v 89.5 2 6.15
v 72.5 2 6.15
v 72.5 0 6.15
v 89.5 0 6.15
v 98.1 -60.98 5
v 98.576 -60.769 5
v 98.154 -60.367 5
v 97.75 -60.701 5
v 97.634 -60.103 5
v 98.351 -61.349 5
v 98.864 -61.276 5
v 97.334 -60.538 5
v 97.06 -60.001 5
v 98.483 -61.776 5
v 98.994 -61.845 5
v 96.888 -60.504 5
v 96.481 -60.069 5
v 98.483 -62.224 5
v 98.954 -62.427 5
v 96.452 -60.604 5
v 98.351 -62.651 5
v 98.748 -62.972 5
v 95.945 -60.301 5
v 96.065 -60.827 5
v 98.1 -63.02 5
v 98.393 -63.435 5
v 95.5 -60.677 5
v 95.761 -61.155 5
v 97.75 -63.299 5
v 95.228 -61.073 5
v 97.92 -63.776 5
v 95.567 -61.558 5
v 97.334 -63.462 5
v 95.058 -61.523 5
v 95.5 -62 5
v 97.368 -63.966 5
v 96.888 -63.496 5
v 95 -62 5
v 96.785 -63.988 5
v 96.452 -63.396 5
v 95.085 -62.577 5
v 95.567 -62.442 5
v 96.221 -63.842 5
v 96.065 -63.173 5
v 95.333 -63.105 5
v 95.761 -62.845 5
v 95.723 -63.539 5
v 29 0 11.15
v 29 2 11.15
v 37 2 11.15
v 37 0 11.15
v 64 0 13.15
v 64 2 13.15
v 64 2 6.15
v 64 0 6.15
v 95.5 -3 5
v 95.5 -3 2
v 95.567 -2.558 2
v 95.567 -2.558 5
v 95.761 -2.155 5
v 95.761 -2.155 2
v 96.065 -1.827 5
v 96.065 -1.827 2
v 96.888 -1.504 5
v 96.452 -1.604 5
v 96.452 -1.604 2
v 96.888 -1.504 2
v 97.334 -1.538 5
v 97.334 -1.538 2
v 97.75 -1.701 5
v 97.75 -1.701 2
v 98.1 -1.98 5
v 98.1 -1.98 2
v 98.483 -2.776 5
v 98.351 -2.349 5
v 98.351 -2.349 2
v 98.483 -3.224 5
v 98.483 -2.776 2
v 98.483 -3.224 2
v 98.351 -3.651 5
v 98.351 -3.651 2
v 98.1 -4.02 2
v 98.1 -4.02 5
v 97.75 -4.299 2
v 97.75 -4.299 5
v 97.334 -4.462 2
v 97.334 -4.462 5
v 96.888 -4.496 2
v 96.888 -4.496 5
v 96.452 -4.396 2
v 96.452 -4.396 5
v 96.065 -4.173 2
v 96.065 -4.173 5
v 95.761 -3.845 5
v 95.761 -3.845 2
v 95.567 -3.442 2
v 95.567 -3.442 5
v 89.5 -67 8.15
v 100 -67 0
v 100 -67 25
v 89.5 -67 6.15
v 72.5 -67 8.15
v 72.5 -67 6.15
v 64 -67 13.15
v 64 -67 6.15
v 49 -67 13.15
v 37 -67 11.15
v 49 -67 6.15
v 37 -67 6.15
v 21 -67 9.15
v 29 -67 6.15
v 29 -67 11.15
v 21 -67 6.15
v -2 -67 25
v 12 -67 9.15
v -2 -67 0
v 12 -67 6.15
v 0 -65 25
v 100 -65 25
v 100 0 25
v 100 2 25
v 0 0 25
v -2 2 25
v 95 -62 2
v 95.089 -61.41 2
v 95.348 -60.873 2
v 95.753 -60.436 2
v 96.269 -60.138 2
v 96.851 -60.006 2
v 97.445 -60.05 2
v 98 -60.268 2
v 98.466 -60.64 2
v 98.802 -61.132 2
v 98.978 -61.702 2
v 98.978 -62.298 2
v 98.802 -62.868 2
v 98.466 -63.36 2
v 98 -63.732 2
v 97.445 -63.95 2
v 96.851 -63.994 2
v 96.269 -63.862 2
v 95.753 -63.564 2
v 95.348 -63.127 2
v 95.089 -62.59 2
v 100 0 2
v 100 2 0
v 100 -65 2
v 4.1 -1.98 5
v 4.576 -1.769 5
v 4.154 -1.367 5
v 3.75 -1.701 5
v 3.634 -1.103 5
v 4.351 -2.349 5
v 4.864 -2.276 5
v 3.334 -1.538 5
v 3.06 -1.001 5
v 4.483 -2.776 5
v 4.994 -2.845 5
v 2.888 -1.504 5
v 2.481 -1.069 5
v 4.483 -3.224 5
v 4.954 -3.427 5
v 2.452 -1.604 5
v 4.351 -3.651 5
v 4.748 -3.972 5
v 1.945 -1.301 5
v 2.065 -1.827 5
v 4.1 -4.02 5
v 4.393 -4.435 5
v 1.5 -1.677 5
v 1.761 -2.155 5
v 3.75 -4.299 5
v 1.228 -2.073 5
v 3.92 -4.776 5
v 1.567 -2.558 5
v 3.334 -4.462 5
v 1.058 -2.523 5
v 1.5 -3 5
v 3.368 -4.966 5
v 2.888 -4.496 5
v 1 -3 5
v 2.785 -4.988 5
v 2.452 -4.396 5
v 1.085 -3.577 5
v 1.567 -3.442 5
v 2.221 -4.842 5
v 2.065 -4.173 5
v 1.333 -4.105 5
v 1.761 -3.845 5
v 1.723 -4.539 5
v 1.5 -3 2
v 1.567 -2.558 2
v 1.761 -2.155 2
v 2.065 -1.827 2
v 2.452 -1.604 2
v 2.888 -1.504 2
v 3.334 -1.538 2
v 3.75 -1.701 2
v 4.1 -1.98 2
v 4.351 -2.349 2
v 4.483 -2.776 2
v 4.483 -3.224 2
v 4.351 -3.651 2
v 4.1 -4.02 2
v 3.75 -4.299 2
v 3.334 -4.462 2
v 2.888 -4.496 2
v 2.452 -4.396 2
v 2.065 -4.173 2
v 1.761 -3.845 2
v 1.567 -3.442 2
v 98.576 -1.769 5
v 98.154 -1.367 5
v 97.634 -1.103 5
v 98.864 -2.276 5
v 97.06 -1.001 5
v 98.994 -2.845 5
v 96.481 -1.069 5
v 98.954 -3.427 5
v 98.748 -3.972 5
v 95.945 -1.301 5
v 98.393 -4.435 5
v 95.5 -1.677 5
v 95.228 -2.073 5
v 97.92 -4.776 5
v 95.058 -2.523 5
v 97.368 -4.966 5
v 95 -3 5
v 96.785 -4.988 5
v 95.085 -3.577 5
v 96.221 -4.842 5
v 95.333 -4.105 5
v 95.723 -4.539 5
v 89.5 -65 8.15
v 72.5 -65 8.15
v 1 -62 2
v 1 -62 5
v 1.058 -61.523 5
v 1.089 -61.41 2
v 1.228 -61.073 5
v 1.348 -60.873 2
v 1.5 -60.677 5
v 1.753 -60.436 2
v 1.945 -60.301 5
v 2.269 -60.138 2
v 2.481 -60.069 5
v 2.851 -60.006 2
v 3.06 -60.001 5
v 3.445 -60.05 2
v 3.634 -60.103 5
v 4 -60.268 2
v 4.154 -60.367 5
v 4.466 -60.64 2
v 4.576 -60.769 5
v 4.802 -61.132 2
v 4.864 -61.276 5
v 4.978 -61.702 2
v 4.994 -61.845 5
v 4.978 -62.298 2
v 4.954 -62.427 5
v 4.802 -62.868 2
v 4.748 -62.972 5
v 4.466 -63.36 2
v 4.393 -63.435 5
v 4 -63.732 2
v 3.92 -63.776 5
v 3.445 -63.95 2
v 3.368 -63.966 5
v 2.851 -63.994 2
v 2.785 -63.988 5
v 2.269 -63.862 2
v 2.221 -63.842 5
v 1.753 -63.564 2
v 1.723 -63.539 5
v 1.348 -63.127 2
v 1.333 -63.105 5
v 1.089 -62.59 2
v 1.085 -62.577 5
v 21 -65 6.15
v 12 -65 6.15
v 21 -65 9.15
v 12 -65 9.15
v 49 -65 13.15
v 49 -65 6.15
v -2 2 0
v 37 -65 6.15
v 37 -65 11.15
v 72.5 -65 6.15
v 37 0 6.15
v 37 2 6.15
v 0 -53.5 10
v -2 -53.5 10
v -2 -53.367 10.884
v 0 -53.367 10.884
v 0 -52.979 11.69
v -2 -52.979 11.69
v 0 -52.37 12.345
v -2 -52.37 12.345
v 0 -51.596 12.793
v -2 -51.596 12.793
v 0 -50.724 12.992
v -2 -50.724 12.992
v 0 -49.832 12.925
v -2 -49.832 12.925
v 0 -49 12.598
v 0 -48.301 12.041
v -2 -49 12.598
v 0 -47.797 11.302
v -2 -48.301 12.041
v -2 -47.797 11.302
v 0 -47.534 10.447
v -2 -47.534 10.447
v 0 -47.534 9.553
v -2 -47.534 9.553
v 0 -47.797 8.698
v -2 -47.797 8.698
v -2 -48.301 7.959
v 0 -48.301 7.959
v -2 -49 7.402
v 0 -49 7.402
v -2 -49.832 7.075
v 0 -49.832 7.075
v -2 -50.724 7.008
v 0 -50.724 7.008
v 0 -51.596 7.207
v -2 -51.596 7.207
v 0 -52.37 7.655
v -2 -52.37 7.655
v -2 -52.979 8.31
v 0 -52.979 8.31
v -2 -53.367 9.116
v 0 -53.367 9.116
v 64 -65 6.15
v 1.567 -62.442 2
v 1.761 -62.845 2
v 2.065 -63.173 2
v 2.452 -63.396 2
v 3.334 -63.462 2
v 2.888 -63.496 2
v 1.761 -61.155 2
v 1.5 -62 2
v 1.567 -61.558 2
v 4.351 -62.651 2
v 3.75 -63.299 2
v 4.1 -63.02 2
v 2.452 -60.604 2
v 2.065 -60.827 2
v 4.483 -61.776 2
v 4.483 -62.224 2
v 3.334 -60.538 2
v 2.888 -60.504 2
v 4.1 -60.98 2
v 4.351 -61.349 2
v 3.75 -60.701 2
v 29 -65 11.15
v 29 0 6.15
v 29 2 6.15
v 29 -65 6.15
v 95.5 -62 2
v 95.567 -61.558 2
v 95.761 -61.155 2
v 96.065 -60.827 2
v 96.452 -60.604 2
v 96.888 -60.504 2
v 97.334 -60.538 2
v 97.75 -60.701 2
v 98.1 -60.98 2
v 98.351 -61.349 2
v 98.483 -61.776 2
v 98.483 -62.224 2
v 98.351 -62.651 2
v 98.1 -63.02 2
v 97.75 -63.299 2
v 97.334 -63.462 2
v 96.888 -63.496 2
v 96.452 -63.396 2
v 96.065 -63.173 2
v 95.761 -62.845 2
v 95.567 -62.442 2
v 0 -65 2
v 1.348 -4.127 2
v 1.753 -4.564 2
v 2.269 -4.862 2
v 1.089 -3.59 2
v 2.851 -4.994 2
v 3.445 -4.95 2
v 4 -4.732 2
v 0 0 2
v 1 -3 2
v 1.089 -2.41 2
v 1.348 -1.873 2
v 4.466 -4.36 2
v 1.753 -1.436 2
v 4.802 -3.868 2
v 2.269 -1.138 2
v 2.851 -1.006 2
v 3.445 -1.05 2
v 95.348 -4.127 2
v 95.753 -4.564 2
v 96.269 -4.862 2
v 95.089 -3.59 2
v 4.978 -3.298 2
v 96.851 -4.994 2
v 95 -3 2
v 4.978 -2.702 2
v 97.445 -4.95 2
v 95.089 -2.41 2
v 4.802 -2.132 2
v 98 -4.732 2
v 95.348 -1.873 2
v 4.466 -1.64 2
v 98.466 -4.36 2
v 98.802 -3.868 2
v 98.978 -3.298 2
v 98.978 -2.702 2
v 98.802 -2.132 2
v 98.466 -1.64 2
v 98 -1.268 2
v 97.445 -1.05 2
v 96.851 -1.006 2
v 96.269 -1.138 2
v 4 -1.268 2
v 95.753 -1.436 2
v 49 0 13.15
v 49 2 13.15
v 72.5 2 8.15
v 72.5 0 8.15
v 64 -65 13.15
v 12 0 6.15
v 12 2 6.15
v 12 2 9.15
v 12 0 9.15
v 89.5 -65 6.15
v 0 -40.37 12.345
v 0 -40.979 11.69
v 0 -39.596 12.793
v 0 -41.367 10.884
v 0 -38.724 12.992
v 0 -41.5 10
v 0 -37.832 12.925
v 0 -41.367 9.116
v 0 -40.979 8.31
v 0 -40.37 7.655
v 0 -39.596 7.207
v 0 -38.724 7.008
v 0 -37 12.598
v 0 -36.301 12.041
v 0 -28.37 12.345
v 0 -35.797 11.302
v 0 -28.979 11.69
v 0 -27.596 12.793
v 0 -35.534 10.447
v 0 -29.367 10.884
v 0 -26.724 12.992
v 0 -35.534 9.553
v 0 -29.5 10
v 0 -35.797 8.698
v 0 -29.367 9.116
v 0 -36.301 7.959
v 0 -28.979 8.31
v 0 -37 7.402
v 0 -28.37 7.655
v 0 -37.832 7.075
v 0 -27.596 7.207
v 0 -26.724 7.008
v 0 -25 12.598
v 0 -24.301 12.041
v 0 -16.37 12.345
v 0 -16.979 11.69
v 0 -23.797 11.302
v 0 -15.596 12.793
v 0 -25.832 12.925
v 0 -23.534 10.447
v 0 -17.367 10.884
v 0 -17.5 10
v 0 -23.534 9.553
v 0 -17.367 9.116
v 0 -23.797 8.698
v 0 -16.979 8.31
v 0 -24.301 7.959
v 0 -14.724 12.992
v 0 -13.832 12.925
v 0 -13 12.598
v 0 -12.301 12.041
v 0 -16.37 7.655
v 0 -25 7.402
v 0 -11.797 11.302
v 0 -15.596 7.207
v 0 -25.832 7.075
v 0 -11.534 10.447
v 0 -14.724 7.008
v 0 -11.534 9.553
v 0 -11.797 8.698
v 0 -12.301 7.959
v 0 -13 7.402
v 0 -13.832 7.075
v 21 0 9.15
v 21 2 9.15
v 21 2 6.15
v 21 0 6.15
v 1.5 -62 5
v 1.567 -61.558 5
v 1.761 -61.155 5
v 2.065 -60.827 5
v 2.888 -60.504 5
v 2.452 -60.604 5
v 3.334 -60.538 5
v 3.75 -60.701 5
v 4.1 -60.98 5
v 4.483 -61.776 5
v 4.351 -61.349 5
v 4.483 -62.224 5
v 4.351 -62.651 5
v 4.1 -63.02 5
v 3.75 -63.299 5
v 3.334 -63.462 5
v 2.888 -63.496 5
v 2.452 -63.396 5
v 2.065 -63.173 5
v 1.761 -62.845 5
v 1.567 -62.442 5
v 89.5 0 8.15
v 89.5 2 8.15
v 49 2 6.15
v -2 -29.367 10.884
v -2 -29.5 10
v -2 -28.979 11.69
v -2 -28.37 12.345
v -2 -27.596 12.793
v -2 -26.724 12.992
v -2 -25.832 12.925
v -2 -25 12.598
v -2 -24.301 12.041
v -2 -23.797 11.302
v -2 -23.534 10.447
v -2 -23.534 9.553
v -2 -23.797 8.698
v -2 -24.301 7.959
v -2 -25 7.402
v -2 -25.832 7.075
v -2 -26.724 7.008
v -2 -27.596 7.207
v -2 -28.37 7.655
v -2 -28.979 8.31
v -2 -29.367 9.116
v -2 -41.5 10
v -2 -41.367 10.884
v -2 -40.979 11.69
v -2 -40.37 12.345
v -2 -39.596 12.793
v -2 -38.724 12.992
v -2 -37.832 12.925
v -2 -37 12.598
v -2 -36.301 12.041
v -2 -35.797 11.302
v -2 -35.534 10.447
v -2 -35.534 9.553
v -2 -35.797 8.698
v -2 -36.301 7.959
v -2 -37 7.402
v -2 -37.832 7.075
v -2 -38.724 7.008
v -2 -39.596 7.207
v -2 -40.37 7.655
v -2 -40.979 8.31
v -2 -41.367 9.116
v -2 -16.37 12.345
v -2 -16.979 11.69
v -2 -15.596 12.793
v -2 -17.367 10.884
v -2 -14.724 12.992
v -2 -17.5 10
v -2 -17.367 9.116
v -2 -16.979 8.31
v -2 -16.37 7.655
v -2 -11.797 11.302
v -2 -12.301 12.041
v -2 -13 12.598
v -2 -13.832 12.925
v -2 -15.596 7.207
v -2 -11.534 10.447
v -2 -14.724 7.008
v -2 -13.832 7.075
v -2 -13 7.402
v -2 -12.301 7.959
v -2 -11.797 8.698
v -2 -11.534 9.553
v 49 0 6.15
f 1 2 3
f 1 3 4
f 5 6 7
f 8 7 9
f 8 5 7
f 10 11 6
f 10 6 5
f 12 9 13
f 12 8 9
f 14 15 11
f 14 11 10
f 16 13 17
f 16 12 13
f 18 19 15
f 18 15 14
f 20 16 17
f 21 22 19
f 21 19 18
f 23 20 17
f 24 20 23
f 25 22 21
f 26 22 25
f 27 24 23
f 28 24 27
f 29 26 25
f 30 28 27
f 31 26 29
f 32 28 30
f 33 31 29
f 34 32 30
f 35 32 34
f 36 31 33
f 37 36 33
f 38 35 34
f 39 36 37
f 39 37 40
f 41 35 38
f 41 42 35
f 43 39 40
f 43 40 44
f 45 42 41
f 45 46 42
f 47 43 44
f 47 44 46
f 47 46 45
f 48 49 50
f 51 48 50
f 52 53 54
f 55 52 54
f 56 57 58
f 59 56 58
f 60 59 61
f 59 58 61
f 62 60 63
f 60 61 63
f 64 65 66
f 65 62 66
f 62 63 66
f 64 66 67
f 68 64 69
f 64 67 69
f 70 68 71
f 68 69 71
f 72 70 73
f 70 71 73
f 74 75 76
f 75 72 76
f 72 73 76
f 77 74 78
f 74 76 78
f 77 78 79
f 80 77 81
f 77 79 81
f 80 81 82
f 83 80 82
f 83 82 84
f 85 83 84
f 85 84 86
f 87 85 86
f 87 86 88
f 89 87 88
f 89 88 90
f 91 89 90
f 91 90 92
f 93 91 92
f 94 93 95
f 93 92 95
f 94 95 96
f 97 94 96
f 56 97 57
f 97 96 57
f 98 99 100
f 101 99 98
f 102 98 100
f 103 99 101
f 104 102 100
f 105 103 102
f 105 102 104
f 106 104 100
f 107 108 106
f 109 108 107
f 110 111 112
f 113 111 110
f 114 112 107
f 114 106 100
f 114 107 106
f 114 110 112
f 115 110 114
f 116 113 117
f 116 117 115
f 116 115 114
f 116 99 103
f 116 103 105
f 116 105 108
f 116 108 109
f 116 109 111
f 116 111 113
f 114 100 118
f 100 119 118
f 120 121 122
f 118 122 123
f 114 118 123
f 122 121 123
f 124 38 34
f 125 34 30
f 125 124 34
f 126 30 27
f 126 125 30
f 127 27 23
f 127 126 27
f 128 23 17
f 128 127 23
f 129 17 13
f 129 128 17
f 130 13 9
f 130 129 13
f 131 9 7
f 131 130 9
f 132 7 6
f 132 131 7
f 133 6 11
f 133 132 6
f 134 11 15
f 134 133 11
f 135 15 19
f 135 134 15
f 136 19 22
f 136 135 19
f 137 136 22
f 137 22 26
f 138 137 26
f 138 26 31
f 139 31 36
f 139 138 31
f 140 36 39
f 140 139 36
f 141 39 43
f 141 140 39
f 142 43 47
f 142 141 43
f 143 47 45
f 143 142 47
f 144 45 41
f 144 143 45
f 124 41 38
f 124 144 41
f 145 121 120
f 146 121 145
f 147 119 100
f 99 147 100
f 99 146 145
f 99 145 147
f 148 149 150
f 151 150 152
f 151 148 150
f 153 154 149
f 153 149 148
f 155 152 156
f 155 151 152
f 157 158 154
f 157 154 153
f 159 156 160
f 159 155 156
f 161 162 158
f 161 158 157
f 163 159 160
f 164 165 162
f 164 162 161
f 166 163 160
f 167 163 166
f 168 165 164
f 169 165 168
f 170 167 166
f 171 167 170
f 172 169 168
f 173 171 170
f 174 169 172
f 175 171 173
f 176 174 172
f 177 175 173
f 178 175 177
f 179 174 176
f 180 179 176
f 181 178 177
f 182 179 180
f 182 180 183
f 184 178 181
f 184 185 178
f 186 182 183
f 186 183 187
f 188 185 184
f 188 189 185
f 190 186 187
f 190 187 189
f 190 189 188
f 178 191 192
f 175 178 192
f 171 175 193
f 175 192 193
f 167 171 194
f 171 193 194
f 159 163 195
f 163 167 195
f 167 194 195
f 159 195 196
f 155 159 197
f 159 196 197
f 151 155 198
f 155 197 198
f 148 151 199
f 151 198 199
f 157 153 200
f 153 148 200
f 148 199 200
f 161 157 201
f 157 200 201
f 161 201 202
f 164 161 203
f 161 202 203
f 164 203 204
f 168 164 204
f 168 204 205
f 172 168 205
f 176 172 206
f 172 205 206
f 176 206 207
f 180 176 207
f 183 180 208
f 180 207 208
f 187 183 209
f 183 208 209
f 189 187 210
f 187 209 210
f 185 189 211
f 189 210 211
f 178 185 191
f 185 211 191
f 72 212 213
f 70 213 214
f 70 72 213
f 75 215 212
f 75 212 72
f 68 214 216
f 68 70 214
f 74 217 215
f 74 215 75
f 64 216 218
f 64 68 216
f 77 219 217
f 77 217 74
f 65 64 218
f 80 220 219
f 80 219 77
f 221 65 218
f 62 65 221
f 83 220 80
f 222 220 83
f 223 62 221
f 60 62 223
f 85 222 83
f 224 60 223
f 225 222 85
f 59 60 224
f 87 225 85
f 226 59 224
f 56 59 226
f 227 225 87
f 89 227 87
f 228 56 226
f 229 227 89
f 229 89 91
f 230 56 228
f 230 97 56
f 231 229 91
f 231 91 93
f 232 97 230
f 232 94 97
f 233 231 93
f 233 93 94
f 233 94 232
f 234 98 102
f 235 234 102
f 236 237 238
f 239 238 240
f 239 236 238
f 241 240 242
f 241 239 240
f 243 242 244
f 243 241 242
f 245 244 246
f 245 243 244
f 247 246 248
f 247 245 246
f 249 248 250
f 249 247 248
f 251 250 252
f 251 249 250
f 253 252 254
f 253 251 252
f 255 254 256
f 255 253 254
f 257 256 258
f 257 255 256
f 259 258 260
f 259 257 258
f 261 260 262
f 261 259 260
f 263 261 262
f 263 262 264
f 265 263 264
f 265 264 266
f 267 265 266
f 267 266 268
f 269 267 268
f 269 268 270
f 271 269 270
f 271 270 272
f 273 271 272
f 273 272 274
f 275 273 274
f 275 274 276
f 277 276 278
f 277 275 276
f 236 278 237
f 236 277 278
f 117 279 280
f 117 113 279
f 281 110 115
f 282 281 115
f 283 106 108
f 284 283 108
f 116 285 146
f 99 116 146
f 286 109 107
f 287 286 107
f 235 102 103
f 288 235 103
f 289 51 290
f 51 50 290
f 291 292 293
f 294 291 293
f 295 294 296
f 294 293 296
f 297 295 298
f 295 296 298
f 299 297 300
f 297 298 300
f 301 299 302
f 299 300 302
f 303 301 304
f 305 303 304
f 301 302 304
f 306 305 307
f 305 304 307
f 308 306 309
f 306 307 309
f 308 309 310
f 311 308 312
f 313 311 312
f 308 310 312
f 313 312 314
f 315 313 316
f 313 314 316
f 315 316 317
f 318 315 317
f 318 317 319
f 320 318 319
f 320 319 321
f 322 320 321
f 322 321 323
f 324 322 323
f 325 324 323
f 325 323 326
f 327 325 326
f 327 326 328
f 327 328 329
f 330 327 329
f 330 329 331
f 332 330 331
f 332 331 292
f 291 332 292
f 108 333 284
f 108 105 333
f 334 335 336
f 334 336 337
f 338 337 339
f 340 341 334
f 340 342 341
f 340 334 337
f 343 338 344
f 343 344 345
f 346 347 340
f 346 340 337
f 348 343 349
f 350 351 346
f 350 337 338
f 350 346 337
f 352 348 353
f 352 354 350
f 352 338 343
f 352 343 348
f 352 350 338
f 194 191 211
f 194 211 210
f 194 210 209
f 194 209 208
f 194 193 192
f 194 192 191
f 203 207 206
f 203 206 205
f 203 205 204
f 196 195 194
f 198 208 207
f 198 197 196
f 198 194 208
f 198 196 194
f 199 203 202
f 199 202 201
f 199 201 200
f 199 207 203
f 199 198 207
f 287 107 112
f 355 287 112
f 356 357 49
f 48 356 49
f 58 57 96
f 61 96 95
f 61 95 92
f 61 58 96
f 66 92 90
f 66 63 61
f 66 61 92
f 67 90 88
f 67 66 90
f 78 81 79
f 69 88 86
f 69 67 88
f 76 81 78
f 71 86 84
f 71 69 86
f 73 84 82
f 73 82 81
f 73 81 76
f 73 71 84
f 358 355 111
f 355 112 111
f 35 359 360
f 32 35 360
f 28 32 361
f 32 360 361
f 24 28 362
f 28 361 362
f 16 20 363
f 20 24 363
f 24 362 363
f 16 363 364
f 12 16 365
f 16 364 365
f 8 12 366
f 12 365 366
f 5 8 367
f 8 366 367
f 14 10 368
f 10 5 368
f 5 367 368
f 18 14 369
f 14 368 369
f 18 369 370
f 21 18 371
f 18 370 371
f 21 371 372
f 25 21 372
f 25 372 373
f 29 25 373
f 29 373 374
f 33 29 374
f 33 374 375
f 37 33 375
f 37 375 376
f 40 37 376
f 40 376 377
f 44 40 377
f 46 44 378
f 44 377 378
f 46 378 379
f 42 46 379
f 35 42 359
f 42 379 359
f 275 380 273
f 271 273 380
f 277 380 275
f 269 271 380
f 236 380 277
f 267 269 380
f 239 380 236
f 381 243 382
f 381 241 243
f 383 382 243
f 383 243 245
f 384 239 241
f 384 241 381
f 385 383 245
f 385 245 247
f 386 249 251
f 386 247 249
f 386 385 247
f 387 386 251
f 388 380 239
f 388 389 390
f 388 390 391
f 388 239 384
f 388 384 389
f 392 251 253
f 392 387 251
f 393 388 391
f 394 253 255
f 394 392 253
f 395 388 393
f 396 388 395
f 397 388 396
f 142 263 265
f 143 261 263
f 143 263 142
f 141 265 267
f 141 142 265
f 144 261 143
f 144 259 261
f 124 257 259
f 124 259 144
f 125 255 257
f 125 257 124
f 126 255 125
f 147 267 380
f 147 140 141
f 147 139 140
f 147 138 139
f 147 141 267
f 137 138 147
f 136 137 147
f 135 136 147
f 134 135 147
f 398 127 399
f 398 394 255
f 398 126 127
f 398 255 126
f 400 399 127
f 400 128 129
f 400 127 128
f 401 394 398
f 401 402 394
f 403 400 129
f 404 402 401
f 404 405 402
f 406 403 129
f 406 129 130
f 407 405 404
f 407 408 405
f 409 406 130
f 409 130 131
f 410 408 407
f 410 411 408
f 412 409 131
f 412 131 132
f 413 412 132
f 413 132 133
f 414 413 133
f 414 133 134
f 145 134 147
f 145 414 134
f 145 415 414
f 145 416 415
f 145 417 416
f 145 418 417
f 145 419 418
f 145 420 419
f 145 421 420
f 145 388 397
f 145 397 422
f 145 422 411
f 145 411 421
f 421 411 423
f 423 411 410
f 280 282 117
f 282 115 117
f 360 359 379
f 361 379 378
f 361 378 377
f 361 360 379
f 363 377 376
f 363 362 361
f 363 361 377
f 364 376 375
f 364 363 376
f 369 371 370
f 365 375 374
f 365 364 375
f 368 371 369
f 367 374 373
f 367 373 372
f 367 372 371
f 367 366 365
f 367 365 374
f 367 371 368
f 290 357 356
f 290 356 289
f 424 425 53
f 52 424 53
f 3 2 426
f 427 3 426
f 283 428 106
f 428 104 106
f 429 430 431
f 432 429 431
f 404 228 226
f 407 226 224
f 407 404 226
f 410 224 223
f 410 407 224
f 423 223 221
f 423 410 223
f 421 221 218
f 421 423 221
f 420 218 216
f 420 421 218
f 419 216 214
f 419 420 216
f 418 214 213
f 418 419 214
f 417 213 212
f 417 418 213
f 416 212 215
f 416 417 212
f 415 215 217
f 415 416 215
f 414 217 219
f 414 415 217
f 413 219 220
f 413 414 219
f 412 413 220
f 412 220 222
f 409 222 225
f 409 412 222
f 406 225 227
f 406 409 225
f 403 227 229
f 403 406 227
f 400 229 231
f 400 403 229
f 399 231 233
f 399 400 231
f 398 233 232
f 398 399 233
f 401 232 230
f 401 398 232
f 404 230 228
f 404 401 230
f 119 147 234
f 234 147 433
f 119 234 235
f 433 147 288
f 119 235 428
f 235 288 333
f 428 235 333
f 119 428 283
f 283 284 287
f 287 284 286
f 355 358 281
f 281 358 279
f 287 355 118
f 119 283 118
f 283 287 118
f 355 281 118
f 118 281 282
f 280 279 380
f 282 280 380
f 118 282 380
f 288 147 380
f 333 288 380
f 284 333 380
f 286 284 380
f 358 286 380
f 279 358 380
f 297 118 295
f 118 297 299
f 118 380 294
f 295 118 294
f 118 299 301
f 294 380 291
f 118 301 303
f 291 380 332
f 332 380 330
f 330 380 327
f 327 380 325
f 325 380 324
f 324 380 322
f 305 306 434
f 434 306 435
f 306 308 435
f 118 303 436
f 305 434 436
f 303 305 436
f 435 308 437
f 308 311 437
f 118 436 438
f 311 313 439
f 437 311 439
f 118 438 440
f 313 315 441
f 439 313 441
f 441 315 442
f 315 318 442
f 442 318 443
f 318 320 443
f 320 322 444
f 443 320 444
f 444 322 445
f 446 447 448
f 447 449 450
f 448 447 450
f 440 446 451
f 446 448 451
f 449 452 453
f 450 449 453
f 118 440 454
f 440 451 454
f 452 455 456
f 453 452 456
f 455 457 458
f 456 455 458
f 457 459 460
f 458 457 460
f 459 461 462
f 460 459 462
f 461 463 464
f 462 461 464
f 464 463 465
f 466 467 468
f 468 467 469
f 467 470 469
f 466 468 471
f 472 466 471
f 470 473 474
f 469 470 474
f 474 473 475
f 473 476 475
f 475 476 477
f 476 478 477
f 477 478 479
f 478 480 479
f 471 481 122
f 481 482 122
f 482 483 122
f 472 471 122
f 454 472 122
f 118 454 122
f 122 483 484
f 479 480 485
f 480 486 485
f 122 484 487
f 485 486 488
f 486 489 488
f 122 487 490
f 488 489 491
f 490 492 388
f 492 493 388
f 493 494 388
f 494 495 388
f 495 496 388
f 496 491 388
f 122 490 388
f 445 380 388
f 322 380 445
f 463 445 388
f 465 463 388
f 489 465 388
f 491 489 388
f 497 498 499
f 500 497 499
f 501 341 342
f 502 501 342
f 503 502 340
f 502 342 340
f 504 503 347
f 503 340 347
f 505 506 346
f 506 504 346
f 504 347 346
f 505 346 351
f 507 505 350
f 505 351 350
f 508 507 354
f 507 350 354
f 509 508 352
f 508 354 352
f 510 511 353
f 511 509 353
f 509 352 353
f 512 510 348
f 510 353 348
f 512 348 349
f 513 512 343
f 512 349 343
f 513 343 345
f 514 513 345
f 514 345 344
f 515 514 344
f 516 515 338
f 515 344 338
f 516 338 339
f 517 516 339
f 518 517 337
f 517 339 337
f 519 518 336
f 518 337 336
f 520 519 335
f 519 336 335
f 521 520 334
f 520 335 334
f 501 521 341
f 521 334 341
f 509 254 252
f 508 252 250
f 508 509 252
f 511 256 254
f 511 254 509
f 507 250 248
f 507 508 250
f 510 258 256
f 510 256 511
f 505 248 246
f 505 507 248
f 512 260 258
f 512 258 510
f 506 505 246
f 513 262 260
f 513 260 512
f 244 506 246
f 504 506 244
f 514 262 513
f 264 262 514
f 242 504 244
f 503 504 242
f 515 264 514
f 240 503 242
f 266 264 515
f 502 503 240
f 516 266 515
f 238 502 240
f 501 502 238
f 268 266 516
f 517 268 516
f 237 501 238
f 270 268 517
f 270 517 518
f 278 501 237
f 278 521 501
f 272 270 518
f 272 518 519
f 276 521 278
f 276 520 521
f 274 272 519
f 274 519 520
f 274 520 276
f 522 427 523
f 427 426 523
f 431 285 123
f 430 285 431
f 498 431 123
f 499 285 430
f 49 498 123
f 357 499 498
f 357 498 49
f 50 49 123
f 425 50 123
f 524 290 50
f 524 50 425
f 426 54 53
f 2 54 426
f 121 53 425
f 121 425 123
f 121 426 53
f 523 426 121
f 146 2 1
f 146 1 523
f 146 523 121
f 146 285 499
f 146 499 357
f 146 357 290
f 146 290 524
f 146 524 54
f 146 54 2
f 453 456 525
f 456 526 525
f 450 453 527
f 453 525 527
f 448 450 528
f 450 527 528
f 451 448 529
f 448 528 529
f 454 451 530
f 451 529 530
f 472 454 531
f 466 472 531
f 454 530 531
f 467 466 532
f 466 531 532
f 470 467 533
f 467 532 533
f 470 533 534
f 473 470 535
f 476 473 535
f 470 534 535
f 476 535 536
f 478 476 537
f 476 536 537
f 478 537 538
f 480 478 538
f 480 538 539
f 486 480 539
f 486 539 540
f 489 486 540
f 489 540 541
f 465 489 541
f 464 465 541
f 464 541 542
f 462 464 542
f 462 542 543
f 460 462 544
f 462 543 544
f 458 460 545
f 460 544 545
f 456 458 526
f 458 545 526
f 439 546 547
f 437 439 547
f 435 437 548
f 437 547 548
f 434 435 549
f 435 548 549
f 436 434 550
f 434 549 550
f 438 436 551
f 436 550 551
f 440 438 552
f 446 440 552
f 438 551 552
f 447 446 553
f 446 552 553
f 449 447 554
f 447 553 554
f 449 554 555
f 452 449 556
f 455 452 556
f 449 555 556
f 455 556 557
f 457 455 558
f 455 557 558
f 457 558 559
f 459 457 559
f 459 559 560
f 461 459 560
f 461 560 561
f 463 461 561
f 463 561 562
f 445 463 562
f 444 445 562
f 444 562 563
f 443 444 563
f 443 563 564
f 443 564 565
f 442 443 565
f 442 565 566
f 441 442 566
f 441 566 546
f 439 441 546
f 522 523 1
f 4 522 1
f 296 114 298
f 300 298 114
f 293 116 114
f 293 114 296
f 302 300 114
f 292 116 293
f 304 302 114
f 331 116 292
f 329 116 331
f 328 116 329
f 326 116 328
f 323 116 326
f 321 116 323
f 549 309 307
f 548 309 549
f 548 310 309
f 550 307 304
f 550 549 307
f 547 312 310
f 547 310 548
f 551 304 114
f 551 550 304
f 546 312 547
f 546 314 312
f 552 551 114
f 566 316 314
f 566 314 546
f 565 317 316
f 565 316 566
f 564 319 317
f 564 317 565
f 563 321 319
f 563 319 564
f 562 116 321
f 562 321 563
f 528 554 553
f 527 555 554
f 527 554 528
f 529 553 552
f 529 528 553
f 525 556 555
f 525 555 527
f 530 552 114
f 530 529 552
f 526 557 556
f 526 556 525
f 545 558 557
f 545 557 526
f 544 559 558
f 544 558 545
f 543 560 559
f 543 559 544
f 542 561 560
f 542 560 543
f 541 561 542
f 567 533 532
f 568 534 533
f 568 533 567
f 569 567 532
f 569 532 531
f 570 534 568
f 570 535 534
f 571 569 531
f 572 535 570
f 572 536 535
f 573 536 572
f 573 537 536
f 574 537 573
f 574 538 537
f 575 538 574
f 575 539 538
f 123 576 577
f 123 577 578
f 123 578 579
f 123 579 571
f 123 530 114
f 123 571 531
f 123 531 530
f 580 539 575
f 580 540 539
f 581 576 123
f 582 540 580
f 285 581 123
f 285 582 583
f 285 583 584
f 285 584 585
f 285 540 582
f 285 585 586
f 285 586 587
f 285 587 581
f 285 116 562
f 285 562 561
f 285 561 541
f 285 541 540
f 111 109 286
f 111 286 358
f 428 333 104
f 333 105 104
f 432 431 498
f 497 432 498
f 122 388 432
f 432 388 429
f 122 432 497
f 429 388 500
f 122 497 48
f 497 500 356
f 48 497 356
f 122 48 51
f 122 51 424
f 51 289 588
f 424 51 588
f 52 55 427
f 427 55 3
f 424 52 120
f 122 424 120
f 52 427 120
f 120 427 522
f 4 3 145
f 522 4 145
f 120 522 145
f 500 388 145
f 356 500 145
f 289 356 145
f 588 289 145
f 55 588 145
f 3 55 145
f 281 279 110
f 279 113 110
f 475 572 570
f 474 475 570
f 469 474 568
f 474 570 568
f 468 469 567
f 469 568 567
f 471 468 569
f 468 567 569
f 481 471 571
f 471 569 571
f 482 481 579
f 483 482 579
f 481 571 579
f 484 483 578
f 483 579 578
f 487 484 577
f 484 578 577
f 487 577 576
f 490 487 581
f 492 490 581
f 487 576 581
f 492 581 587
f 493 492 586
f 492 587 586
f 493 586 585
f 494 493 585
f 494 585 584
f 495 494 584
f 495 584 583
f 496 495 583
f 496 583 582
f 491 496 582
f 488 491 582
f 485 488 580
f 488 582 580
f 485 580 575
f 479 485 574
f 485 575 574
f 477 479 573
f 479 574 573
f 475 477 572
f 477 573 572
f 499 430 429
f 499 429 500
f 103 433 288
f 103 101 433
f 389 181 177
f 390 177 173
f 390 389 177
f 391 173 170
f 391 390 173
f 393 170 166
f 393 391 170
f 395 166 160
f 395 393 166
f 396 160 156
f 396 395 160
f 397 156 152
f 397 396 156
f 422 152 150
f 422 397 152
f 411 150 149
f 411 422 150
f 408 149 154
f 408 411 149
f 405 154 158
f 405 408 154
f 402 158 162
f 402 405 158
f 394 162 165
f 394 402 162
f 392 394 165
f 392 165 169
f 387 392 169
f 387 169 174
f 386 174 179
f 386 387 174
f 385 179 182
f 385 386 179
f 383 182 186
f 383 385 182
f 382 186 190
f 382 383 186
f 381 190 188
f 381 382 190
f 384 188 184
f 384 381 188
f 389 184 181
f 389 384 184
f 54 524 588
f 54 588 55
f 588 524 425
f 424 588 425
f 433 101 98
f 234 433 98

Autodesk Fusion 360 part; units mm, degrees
sketch "Sketch1" plane through (0, 0, 0) normal (0, 0, 1) x (1, 0, 0)
  line L0 (0, 0) -> (100, 0)
  line L1 (100, 0) -> (100, -65)
  line L2 (100, -65) -> (0, -65)
  line L3 (0, -65) -> (0, 0)
  dimension "d1" = 100
  dimension "d2" = 65
extrude "Extrude1" add sketch "Sketch1" along normal blind 2
sketch "Sketch2" plane through (0, 0, 2) normal (0, 0, 1) x (-1, 0, 0)
  line L0 (0, 65) -> (-100, 65)
  line L1 (-100, 65) -> (-100, 0)
  line L2 (-100, 0) -> (0, 0)
  line L3 (0, 0) -> (0, 65)
  line L4 (0, 65) -> (-120, 65)
  line L5 (-120, 65) -> (-210, 65)
  line L6 (-210, 65) -> (-290, 65)
  line L7 (-290, 65) -> (-370, 65)
  line L8 (-370, 65) -> (-490, 65)
  line L9 (-490, 65) -> (-640, 65)
  line L10 (-640, 65) -> (-725, 65)
  line L11 (-725, 65) -> (-895, 65)
  line L12 (-895, 65) -> (-1000, 65)
  line L13 (0, 0) -> (-1.5, 0)
  line L14 (-1.5, 0) -> (-1.5, 1.5)
  line L15 (-1.5, 1.5) -> (-1.5, 3)
  line L16 (-1.5, 3) -> (-3, 3)
  circle A0 centre (-3, 3) radius 1.5
  circle A1 centre (-3, 3) radius 2
  dimension "d5" = 120
  dimension "d6" = 90
  dimension "d7" = 80
  dimension "d8" = 80
  dimension "d9" = 120
  dimension "d10" = 150
  dimension "d11" = 85
  dimension "d12" = 170
  dimension "d13" = 105
  dimension "d14" = 1.5
  dimension "d15" = 1.5
  dimension "d16" = 1.5
  dimension "d17" = 1.5
  dimension "d18" = 3
extrude "Extrude2" add sketch "Sketch2" along normal blind 3 contours A1
pattern_linear "R-Pattern2" count 2 spacing 94 along (1, 0, 0) count 2 spacing 59 along (0, -1, 0) of "Extrude2"
sketch "Sketch4" plane through (0, 0, 0) normal (0, 0, -1) x (1, 0, 0)
  line L0 (100, 65) -> (0, 65)
  line L1 (0, 65) -> (0, 0)
  line L2 (0, 0) -> (100, 0)
  line L3 (100, 0) -> (100, 65)
  line L4 (0, 0) -> (-2, 0)
  line L5 (-2, 0) -> (-2, 65)
  line L6 (-2, 65) -> (0, 65)
  line L7 (0, 65) -> (0, 0)
  line L8 (-2, 65) -> (100, 65)
  line L9 (100, 65) -> (100, 67)
  line L10 (100, 67) -> (-2, 67)
  line L11 (-2, 67) -> (-2, 65)
  dimension "d37" = 2
  dimension "d38" = 2
extrude "Extrude6" add sketch "Sketch4" against normal blind 25 contours L0 L6 L8 L9 L10 L11 | L1 L4 L5 L6 L7 L8
sketch "Sketch5" plane through (0, -67, 0) normal (0, -1, 0) x (1, 0, 0)
  line L0 (-2, 0) -> (100, 0)
  line L1 (100, 0) -> (100, 25)
  line L2 (100, 25) -> (-2, 25)
  line L3 (-2, 25) -> (-2, 0)
  line L4 (0, 25) -> (0, 0) construction
  line L5 (0, 5) -> (100, 5) construction
  line L6 (0, 5) -> (100, 5)
  line L7 (100, 5) -> (100, 6.15)
  line L8 (100, 6.15) -> (0, 6.15)
  line L9 (0, 6.15) -> (0, 5)
  line L10 (0, 6.15) -> (12, 6.15)
  line L11 (12, 6.15) -> (21, 6.15)
  line L12 (21, 6.15) -> (21, 9.15)
  line L13 (21, 9.15) -> (12, 9.15)
  line L14 (12, 9.15) -> (12, 6.15)
  line L15 (21, 6.15) -> (29, 6.15)
  line L16 (29, 6.15) -> (37, 6.15)
  line L17 (37, 6.15) -> (37, 11.15)
  line L18 (37, 11.15) -> (29, 11.15)
  line L19 (29, 11.15) -> (29, 6.15)
  line L20 (37, 6.15) -> (49, 6.15)
  line L21 (49, 6.15) -> (64, 6.15)
  line L22 (64, 6.15) -> (64, 13.15)
  line L23 (64, 13.15) -> (49, 13.15)
  line L24 (49, 13.15) -> (49, 6.15)
  line L25 (64, 6.15) -> (72.5, 6.15)
  line L26 (72.5, 6.15) -> (89.5, 6.15)
  line L27 (89.5, 6.15) -> (89.5, 8.15)
  line L28 (89.5, 8.15) -> (72.5, 8.15)
  line L29 (72.5, 8.15) -> (72.5, 6.15)
  line L30 (89.5, 6.15) -> (100, 6.15)
  dimension "d41" = 1.15
  dimension "d42" = 12
  dimension "d43" = 9
  dimension "d44" = 3
  dimension "d45" = 8
  dimension "d46" = 8
  dimension "d47" = 5
  dimension "d48" = 12
  dimension "d49" = 15
  dimension "d50" = 7
  dimension "d51" = 8.5
  dimension "d52" = 17
  dimension "d53" = 2
extrude "Extrude7" cut sketch "Sketch5" against normal up to surface (2 mm away) contours L8 L26 L27 L28 L29 | L8 L11 L12 L13 L14 | L8 L21 L22 L23 L24 | L8 L16 L17 L18 L19
sketch "Sketch6" plane through (-2, 0, 0) normal (-1, 0, 0) x (0, -1, 0)
  line L0 (0, 0) -> (67, 0)
  line L1 (67, 0) -> (67, 25)
  line L2 (67, 25) -> (0, 25)
  line L3 (0, 25) -> (0, 0)
  line L4 (65, 25) -> (65, 0)
  line L5 (67, 5) -> (0, 5)
  line L6 (67, 5) -> (0, 5)
  line L7 (0, 5) -> (0, 6.15)
  line L8 (0, 6.15) -> (67, 6.15) construction
  line L9 (67, 6.15) -> (67, 5)
  line L10 (65, 5) -> (65, 10)
  line L11 (65, 10) -> (0, 10)
  line L12 (65, 10) -> (50.5, 10)
  circle A0 centre (50.5, 10) radius 3
  line L13 (50.5, 10) -> (38.5, 10)
  circle A1 centre (38.5, 10) radius 3
  line L14 (38.5, 10) -> (26.5, 10)
  circle A2 centre (26.5, 10) radius 3
  line L15 (26.5, 10) -> (14.5, 10)
  circle A3 centre (14.5, 10) radius 3
  dimension "d56" = 67
  dimension "d57" = 1.15
  dimension "d58" = 5
  dimension "d59" = 14.5
  dimension "d60" = 6
  dimension "d61" = 12
  dimension "d62" = 12
  dimension "d63" = 12
ref_plane "WorkPlane1" through (50, -32.5, 13.5) normal (0, 1, 0) x (-1, 0, 0)
mirror "Mirror1" about plane through (50, -32.5, 13.5) normal (0, 1, 0) of "Extrude6"
extrude "Extrude8" cut sketch "Sketch6" against normal up to surface (2 mm away) contours L11 L12 A0 L13 | L11 L12 A0 L13 | L11 L15 A3 | L11 L15 A3 | L11 L13 A1 L14 | L11 L13 A1 L14 | L11 L14 A2 L15 | L11 L14 A2 L15
mirror "Mirror2" about plane through (50, -32.5, 13.5) normal (0, 1, 0) of "Extrude7"
